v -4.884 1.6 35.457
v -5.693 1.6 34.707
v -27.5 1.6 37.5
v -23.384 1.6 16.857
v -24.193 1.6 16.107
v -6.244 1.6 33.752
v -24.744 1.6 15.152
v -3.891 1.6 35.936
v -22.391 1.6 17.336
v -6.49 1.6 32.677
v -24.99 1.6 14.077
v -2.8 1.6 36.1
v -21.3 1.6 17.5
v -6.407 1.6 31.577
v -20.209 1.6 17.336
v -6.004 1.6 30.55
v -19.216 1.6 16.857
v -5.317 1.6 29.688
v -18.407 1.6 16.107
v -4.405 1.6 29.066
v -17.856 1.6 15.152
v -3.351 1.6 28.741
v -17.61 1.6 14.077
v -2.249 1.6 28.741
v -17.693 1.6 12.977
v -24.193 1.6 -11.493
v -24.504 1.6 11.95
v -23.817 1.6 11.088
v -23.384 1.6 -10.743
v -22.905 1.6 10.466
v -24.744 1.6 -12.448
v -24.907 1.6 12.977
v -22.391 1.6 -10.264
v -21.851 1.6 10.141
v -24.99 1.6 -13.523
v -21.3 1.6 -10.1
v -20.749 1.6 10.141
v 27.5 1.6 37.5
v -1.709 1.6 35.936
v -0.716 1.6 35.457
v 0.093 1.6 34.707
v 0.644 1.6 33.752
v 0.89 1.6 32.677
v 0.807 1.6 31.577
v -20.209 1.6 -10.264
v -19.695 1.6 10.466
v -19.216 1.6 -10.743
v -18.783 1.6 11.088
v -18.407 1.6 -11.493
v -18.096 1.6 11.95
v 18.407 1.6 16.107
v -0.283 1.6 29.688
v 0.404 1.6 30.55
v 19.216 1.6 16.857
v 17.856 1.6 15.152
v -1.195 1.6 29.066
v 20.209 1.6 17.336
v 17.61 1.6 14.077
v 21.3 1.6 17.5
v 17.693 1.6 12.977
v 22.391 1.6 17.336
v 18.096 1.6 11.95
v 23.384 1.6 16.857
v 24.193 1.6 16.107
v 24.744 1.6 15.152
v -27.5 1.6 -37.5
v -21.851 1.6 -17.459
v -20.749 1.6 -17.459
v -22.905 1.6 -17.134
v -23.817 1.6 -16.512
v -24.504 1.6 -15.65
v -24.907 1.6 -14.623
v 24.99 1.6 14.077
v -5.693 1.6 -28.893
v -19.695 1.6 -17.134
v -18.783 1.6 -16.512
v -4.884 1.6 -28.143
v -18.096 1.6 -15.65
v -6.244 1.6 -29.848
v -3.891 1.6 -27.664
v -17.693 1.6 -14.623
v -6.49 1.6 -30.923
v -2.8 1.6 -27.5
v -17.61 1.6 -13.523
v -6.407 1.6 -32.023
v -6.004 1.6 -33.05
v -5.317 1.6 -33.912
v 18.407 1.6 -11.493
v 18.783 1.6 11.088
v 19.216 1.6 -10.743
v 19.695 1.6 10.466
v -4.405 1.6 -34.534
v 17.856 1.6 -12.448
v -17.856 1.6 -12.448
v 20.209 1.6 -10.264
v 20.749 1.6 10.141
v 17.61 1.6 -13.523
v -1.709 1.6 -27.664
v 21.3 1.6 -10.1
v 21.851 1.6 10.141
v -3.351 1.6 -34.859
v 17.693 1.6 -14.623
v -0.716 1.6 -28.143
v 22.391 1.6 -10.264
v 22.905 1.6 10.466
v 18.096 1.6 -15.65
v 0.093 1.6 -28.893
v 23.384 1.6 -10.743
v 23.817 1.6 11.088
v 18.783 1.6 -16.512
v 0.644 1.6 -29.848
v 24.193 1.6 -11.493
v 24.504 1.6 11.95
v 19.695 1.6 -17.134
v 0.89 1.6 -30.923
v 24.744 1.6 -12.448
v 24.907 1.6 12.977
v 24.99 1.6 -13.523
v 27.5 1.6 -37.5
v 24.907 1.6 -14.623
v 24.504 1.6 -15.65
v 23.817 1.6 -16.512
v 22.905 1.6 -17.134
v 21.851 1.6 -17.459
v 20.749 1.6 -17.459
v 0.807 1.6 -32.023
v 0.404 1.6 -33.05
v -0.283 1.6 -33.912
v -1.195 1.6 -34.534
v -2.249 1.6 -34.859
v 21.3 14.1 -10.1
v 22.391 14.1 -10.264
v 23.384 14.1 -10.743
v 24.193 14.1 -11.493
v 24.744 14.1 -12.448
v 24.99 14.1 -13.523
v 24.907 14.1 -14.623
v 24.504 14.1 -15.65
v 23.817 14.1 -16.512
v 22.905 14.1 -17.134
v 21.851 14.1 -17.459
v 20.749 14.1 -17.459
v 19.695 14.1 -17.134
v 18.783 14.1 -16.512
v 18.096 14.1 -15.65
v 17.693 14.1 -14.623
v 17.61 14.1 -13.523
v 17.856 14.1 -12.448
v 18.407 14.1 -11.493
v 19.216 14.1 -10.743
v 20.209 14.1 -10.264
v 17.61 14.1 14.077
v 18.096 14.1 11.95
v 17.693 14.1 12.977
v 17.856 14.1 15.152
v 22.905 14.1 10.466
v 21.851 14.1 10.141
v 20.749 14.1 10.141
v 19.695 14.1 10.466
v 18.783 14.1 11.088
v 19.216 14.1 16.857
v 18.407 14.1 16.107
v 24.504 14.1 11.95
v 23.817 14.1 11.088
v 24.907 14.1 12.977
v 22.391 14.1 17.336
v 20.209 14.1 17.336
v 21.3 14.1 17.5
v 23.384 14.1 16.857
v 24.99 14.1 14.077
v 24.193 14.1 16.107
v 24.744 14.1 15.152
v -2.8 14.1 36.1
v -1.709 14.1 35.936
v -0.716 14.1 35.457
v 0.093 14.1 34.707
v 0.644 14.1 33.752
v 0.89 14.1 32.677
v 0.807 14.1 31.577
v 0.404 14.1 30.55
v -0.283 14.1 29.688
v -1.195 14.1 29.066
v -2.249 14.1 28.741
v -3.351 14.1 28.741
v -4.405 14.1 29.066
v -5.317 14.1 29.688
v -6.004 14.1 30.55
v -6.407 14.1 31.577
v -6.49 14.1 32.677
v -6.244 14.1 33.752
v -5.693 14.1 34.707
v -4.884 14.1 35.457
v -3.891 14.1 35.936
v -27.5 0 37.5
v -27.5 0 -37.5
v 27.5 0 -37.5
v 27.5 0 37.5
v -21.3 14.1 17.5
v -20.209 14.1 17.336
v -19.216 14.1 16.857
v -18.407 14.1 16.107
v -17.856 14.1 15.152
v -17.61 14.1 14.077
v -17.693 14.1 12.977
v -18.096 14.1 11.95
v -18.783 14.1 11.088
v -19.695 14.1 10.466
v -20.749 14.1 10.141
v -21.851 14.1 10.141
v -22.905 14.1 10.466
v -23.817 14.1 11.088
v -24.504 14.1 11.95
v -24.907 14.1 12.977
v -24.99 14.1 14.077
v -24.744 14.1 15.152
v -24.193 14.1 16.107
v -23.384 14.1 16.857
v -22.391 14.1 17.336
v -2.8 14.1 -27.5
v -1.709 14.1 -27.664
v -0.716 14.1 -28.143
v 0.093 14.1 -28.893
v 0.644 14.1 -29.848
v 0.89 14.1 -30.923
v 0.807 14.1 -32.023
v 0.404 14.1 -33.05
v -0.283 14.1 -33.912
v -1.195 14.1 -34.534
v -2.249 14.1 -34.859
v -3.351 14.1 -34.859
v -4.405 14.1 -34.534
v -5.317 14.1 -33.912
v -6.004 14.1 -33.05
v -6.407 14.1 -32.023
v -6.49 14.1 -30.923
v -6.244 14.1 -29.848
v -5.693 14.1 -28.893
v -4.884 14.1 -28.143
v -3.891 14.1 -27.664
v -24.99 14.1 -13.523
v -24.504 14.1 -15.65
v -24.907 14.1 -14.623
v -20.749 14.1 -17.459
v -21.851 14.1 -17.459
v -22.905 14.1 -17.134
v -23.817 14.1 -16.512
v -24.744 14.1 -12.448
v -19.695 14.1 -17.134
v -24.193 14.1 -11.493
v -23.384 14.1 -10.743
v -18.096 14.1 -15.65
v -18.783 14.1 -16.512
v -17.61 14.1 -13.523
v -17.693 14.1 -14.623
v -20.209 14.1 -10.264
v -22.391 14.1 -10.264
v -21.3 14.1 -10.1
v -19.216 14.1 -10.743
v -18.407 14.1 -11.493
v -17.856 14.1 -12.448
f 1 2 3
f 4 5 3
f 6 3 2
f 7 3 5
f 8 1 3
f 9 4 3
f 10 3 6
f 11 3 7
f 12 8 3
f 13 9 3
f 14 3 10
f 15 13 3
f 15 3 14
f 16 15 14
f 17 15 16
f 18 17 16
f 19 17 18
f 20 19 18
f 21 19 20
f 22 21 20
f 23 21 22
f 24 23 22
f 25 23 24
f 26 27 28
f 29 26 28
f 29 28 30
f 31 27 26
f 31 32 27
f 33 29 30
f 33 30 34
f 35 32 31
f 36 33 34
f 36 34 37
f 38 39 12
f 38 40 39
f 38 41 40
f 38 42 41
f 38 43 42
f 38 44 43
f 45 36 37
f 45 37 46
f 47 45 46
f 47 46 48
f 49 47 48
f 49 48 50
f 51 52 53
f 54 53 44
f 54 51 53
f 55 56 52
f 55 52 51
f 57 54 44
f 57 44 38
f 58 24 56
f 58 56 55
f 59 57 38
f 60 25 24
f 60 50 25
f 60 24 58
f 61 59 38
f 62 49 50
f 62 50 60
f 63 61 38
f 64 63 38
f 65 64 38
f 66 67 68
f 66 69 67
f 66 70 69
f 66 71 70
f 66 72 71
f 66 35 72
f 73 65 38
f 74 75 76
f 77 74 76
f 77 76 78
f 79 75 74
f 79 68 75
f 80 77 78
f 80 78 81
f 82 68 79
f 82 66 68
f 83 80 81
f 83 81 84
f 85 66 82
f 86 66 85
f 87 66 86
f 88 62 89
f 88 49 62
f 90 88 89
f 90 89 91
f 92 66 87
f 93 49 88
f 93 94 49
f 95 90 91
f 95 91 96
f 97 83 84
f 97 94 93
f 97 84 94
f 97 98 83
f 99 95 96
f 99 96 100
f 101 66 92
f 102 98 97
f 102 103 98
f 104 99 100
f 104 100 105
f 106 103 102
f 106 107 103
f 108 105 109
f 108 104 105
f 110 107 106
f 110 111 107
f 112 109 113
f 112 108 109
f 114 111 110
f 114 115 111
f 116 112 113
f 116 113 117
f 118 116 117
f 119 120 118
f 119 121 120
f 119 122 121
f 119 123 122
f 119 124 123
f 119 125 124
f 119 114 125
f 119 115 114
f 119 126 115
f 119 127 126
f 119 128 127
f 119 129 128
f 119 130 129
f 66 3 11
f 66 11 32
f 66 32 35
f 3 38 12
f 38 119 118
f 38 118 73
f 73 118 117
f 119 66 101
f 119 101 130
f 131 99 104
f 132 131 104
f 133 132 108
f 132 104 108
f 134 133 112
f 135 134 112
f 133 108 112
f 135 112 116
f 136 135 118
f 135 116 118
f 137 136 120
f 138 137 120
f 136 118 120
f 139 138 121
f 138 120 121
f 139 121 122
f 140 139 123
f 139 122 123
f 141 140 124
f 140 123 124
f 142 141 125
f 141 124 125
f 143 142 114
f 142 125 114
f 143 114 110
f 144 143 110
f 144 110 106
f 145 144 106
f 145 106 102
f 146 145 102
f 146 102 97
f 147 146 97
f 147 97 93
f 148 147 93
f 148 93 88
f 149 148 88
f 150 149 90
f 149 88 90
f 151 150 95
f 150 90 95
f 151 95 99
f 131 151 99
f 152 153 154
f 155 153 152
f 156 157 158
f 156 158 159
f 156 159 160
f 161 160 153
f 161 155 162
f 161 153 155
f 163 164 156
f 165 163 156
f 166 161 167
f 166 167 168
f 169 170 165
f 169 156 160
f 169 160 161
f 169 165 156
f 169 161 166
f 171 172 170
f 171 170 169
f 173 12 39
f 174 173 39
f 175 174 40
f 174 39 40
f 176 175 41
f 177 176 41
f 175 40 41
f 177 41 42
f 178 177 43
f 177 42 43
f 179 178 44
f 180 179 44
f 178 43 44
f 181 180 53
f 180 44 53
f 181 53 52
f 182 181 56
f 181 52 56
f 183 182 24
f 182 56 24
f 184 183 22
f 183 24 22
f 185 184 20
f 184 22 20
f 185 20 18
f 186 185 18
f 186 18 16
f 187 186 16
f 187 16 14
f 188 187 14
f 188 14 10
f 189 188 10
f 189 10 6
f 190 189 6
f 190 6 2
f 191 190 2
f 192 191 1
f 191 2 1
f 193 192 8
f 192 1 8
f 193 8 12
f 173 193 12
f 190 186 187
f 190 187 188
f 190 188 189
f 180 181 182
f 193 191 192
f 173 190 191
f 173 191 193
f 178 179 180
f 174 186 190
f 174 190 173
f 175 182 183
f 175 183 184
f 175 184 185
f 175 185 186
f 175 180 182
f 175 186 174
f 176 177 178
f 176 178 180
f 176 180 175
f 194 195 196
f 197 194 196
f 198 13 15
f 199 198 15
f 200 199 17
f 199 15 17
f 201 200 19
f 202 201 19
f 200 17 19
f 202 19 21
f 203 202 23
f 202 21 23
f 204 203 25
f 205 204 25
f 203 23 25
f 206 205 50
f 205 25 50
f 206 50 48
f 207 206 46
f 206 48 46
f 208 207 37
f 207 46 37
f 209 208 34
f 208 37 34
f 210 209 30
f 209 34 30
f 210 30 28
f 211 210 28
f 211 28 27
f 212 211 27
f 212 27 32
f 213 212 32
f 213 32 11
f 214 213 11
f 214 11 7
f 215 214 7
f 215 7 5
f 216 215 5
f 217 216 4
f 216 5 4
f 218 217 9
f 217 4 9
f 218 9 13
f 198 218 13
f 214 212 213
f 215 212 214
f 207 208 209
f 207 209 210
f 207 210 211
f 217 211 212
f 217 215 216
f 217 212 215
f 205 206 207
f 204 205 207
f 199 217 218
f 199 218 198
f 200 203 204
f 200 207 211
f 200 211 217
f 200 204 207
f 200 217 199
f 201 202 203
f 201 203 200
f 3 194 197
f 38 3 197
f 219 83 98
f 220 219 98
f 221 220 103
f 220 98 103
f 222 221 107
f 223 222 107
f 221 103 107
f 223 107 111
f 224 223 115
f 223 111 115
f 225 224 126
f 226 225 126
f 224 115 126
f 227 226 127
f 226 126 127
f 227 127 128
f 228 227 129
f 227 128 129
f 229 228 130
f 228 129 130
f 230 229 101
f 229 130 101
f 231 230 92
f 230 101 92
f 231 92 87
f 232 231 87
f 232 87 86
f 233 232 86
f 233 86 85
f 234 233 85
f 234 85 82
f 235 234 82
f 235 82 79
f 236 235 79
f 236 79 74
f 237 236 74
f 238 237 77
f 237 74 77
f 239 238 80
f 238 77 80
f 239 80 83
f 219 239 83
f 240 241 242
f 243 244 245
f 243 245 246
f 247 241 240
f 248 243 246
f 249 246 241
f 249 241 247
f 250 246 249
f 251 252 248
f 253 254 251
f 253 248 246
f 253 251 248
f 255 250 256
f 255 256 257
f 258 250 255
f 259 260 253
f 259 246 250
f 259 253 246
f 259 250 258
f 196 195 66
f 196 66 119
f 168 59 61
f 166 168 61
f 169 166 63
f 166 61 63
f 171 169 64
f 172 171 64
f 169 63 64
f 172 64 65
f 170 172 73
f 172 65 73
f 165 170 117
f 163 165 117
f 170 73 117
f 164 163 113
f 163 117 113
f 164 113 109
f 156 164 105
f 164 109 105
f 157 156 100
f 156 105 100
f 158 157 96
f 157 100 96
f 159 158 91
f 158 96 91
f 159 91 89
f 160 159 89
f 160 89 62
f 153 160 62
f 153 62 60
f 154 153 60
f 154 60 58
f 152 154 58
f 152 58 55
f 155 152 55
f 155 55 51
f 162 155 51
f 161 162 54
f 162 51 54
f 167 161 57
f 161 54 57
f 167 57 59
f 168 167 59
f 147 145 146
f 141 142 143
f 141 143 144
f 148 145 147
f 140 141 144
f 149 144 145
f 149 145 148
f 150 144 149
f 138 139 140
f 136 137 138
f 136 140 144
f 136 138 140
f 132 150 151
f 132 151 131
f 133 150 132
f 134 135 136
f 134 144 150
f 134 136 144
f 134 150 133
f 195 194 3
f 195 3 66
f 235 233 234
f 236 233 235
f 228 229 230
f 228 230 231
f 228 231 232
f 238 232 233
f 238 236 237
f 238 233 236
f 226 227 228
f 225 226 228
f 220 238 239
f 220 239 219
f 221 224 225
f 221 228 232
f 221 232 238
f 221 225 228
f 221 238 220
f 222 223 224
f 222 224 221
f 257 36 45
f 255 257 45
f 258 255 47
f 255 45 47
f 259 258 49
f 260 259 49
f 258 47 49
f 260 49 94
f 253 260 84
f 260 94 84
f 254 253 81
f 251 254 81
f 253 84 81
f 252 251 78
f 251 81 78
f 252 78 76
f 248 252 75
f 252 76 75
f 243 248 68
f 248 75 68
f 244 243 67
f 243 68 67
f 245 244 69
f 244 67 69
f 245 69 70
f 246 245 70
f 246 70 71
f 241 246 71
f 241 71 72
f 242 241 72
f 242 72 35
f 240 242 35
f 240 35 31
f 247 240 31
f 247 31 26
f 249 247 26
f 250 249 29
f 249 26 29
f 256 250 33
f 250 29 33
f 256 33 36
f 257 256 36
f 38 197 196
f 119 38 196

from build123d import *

# Parameters (mm, degrees)
SKETCH1_W           = 55
SKETCH1_H           = 75
BOSS_EXTRUDE1_DEPTH = 1.6
SKETCH2_R           = 3.7
BOSS_EXTRUDE2_DEPTH = 12.5


with BuildPart() as part:
    # Sketch1 → Boss-Extrude1 (new body)
    with BuildSketch(Plane(origin=(0, 0, 0), x_dir=(1, 0, 0), z_dir=(0, 1, 0))):
        Rectangle(SKETCH1_W, SKETCH1_H)
    extrude(amount=BOSS_EXTRUDE1_DEPTH)

    # Sketch2 → Boss-Extrude2 (add)
    with BuildSketch(Plane(origin=(0, 1.6, 0), x_dir=(1, 0, 0), z_dir=(0, 1, 0))):
        with Locations(Location((-2.8, -32.4, 0), (0, 0, 270))):
            Circle(SKETCH2_R)
        with Locations(Location((-21.3, -13.8, 0), (0, 0, 270))):
            Circle(SKETCH2_R)
        with Locations(Location((-21.3, 13.8, 0), (0, 0, 270))):
            Circle(SKETCH2_R)
        with Locations(Location((-2.8, 31.2, 0), (0, 0, 270))):
            Circle(SKETCH2_R)
        with Locations(Location((21.3, 13.8, 0), (0, 0, 270))):
            Circle(SKETCH2_R)
        with Locations(Location((21.3, -13.8, 0), (0, 0, 270))):
            Circle(SKETCH2_R)
    extrude(amount=BOSS_EXTRUDE2_DEPTH)


solid = part.part
